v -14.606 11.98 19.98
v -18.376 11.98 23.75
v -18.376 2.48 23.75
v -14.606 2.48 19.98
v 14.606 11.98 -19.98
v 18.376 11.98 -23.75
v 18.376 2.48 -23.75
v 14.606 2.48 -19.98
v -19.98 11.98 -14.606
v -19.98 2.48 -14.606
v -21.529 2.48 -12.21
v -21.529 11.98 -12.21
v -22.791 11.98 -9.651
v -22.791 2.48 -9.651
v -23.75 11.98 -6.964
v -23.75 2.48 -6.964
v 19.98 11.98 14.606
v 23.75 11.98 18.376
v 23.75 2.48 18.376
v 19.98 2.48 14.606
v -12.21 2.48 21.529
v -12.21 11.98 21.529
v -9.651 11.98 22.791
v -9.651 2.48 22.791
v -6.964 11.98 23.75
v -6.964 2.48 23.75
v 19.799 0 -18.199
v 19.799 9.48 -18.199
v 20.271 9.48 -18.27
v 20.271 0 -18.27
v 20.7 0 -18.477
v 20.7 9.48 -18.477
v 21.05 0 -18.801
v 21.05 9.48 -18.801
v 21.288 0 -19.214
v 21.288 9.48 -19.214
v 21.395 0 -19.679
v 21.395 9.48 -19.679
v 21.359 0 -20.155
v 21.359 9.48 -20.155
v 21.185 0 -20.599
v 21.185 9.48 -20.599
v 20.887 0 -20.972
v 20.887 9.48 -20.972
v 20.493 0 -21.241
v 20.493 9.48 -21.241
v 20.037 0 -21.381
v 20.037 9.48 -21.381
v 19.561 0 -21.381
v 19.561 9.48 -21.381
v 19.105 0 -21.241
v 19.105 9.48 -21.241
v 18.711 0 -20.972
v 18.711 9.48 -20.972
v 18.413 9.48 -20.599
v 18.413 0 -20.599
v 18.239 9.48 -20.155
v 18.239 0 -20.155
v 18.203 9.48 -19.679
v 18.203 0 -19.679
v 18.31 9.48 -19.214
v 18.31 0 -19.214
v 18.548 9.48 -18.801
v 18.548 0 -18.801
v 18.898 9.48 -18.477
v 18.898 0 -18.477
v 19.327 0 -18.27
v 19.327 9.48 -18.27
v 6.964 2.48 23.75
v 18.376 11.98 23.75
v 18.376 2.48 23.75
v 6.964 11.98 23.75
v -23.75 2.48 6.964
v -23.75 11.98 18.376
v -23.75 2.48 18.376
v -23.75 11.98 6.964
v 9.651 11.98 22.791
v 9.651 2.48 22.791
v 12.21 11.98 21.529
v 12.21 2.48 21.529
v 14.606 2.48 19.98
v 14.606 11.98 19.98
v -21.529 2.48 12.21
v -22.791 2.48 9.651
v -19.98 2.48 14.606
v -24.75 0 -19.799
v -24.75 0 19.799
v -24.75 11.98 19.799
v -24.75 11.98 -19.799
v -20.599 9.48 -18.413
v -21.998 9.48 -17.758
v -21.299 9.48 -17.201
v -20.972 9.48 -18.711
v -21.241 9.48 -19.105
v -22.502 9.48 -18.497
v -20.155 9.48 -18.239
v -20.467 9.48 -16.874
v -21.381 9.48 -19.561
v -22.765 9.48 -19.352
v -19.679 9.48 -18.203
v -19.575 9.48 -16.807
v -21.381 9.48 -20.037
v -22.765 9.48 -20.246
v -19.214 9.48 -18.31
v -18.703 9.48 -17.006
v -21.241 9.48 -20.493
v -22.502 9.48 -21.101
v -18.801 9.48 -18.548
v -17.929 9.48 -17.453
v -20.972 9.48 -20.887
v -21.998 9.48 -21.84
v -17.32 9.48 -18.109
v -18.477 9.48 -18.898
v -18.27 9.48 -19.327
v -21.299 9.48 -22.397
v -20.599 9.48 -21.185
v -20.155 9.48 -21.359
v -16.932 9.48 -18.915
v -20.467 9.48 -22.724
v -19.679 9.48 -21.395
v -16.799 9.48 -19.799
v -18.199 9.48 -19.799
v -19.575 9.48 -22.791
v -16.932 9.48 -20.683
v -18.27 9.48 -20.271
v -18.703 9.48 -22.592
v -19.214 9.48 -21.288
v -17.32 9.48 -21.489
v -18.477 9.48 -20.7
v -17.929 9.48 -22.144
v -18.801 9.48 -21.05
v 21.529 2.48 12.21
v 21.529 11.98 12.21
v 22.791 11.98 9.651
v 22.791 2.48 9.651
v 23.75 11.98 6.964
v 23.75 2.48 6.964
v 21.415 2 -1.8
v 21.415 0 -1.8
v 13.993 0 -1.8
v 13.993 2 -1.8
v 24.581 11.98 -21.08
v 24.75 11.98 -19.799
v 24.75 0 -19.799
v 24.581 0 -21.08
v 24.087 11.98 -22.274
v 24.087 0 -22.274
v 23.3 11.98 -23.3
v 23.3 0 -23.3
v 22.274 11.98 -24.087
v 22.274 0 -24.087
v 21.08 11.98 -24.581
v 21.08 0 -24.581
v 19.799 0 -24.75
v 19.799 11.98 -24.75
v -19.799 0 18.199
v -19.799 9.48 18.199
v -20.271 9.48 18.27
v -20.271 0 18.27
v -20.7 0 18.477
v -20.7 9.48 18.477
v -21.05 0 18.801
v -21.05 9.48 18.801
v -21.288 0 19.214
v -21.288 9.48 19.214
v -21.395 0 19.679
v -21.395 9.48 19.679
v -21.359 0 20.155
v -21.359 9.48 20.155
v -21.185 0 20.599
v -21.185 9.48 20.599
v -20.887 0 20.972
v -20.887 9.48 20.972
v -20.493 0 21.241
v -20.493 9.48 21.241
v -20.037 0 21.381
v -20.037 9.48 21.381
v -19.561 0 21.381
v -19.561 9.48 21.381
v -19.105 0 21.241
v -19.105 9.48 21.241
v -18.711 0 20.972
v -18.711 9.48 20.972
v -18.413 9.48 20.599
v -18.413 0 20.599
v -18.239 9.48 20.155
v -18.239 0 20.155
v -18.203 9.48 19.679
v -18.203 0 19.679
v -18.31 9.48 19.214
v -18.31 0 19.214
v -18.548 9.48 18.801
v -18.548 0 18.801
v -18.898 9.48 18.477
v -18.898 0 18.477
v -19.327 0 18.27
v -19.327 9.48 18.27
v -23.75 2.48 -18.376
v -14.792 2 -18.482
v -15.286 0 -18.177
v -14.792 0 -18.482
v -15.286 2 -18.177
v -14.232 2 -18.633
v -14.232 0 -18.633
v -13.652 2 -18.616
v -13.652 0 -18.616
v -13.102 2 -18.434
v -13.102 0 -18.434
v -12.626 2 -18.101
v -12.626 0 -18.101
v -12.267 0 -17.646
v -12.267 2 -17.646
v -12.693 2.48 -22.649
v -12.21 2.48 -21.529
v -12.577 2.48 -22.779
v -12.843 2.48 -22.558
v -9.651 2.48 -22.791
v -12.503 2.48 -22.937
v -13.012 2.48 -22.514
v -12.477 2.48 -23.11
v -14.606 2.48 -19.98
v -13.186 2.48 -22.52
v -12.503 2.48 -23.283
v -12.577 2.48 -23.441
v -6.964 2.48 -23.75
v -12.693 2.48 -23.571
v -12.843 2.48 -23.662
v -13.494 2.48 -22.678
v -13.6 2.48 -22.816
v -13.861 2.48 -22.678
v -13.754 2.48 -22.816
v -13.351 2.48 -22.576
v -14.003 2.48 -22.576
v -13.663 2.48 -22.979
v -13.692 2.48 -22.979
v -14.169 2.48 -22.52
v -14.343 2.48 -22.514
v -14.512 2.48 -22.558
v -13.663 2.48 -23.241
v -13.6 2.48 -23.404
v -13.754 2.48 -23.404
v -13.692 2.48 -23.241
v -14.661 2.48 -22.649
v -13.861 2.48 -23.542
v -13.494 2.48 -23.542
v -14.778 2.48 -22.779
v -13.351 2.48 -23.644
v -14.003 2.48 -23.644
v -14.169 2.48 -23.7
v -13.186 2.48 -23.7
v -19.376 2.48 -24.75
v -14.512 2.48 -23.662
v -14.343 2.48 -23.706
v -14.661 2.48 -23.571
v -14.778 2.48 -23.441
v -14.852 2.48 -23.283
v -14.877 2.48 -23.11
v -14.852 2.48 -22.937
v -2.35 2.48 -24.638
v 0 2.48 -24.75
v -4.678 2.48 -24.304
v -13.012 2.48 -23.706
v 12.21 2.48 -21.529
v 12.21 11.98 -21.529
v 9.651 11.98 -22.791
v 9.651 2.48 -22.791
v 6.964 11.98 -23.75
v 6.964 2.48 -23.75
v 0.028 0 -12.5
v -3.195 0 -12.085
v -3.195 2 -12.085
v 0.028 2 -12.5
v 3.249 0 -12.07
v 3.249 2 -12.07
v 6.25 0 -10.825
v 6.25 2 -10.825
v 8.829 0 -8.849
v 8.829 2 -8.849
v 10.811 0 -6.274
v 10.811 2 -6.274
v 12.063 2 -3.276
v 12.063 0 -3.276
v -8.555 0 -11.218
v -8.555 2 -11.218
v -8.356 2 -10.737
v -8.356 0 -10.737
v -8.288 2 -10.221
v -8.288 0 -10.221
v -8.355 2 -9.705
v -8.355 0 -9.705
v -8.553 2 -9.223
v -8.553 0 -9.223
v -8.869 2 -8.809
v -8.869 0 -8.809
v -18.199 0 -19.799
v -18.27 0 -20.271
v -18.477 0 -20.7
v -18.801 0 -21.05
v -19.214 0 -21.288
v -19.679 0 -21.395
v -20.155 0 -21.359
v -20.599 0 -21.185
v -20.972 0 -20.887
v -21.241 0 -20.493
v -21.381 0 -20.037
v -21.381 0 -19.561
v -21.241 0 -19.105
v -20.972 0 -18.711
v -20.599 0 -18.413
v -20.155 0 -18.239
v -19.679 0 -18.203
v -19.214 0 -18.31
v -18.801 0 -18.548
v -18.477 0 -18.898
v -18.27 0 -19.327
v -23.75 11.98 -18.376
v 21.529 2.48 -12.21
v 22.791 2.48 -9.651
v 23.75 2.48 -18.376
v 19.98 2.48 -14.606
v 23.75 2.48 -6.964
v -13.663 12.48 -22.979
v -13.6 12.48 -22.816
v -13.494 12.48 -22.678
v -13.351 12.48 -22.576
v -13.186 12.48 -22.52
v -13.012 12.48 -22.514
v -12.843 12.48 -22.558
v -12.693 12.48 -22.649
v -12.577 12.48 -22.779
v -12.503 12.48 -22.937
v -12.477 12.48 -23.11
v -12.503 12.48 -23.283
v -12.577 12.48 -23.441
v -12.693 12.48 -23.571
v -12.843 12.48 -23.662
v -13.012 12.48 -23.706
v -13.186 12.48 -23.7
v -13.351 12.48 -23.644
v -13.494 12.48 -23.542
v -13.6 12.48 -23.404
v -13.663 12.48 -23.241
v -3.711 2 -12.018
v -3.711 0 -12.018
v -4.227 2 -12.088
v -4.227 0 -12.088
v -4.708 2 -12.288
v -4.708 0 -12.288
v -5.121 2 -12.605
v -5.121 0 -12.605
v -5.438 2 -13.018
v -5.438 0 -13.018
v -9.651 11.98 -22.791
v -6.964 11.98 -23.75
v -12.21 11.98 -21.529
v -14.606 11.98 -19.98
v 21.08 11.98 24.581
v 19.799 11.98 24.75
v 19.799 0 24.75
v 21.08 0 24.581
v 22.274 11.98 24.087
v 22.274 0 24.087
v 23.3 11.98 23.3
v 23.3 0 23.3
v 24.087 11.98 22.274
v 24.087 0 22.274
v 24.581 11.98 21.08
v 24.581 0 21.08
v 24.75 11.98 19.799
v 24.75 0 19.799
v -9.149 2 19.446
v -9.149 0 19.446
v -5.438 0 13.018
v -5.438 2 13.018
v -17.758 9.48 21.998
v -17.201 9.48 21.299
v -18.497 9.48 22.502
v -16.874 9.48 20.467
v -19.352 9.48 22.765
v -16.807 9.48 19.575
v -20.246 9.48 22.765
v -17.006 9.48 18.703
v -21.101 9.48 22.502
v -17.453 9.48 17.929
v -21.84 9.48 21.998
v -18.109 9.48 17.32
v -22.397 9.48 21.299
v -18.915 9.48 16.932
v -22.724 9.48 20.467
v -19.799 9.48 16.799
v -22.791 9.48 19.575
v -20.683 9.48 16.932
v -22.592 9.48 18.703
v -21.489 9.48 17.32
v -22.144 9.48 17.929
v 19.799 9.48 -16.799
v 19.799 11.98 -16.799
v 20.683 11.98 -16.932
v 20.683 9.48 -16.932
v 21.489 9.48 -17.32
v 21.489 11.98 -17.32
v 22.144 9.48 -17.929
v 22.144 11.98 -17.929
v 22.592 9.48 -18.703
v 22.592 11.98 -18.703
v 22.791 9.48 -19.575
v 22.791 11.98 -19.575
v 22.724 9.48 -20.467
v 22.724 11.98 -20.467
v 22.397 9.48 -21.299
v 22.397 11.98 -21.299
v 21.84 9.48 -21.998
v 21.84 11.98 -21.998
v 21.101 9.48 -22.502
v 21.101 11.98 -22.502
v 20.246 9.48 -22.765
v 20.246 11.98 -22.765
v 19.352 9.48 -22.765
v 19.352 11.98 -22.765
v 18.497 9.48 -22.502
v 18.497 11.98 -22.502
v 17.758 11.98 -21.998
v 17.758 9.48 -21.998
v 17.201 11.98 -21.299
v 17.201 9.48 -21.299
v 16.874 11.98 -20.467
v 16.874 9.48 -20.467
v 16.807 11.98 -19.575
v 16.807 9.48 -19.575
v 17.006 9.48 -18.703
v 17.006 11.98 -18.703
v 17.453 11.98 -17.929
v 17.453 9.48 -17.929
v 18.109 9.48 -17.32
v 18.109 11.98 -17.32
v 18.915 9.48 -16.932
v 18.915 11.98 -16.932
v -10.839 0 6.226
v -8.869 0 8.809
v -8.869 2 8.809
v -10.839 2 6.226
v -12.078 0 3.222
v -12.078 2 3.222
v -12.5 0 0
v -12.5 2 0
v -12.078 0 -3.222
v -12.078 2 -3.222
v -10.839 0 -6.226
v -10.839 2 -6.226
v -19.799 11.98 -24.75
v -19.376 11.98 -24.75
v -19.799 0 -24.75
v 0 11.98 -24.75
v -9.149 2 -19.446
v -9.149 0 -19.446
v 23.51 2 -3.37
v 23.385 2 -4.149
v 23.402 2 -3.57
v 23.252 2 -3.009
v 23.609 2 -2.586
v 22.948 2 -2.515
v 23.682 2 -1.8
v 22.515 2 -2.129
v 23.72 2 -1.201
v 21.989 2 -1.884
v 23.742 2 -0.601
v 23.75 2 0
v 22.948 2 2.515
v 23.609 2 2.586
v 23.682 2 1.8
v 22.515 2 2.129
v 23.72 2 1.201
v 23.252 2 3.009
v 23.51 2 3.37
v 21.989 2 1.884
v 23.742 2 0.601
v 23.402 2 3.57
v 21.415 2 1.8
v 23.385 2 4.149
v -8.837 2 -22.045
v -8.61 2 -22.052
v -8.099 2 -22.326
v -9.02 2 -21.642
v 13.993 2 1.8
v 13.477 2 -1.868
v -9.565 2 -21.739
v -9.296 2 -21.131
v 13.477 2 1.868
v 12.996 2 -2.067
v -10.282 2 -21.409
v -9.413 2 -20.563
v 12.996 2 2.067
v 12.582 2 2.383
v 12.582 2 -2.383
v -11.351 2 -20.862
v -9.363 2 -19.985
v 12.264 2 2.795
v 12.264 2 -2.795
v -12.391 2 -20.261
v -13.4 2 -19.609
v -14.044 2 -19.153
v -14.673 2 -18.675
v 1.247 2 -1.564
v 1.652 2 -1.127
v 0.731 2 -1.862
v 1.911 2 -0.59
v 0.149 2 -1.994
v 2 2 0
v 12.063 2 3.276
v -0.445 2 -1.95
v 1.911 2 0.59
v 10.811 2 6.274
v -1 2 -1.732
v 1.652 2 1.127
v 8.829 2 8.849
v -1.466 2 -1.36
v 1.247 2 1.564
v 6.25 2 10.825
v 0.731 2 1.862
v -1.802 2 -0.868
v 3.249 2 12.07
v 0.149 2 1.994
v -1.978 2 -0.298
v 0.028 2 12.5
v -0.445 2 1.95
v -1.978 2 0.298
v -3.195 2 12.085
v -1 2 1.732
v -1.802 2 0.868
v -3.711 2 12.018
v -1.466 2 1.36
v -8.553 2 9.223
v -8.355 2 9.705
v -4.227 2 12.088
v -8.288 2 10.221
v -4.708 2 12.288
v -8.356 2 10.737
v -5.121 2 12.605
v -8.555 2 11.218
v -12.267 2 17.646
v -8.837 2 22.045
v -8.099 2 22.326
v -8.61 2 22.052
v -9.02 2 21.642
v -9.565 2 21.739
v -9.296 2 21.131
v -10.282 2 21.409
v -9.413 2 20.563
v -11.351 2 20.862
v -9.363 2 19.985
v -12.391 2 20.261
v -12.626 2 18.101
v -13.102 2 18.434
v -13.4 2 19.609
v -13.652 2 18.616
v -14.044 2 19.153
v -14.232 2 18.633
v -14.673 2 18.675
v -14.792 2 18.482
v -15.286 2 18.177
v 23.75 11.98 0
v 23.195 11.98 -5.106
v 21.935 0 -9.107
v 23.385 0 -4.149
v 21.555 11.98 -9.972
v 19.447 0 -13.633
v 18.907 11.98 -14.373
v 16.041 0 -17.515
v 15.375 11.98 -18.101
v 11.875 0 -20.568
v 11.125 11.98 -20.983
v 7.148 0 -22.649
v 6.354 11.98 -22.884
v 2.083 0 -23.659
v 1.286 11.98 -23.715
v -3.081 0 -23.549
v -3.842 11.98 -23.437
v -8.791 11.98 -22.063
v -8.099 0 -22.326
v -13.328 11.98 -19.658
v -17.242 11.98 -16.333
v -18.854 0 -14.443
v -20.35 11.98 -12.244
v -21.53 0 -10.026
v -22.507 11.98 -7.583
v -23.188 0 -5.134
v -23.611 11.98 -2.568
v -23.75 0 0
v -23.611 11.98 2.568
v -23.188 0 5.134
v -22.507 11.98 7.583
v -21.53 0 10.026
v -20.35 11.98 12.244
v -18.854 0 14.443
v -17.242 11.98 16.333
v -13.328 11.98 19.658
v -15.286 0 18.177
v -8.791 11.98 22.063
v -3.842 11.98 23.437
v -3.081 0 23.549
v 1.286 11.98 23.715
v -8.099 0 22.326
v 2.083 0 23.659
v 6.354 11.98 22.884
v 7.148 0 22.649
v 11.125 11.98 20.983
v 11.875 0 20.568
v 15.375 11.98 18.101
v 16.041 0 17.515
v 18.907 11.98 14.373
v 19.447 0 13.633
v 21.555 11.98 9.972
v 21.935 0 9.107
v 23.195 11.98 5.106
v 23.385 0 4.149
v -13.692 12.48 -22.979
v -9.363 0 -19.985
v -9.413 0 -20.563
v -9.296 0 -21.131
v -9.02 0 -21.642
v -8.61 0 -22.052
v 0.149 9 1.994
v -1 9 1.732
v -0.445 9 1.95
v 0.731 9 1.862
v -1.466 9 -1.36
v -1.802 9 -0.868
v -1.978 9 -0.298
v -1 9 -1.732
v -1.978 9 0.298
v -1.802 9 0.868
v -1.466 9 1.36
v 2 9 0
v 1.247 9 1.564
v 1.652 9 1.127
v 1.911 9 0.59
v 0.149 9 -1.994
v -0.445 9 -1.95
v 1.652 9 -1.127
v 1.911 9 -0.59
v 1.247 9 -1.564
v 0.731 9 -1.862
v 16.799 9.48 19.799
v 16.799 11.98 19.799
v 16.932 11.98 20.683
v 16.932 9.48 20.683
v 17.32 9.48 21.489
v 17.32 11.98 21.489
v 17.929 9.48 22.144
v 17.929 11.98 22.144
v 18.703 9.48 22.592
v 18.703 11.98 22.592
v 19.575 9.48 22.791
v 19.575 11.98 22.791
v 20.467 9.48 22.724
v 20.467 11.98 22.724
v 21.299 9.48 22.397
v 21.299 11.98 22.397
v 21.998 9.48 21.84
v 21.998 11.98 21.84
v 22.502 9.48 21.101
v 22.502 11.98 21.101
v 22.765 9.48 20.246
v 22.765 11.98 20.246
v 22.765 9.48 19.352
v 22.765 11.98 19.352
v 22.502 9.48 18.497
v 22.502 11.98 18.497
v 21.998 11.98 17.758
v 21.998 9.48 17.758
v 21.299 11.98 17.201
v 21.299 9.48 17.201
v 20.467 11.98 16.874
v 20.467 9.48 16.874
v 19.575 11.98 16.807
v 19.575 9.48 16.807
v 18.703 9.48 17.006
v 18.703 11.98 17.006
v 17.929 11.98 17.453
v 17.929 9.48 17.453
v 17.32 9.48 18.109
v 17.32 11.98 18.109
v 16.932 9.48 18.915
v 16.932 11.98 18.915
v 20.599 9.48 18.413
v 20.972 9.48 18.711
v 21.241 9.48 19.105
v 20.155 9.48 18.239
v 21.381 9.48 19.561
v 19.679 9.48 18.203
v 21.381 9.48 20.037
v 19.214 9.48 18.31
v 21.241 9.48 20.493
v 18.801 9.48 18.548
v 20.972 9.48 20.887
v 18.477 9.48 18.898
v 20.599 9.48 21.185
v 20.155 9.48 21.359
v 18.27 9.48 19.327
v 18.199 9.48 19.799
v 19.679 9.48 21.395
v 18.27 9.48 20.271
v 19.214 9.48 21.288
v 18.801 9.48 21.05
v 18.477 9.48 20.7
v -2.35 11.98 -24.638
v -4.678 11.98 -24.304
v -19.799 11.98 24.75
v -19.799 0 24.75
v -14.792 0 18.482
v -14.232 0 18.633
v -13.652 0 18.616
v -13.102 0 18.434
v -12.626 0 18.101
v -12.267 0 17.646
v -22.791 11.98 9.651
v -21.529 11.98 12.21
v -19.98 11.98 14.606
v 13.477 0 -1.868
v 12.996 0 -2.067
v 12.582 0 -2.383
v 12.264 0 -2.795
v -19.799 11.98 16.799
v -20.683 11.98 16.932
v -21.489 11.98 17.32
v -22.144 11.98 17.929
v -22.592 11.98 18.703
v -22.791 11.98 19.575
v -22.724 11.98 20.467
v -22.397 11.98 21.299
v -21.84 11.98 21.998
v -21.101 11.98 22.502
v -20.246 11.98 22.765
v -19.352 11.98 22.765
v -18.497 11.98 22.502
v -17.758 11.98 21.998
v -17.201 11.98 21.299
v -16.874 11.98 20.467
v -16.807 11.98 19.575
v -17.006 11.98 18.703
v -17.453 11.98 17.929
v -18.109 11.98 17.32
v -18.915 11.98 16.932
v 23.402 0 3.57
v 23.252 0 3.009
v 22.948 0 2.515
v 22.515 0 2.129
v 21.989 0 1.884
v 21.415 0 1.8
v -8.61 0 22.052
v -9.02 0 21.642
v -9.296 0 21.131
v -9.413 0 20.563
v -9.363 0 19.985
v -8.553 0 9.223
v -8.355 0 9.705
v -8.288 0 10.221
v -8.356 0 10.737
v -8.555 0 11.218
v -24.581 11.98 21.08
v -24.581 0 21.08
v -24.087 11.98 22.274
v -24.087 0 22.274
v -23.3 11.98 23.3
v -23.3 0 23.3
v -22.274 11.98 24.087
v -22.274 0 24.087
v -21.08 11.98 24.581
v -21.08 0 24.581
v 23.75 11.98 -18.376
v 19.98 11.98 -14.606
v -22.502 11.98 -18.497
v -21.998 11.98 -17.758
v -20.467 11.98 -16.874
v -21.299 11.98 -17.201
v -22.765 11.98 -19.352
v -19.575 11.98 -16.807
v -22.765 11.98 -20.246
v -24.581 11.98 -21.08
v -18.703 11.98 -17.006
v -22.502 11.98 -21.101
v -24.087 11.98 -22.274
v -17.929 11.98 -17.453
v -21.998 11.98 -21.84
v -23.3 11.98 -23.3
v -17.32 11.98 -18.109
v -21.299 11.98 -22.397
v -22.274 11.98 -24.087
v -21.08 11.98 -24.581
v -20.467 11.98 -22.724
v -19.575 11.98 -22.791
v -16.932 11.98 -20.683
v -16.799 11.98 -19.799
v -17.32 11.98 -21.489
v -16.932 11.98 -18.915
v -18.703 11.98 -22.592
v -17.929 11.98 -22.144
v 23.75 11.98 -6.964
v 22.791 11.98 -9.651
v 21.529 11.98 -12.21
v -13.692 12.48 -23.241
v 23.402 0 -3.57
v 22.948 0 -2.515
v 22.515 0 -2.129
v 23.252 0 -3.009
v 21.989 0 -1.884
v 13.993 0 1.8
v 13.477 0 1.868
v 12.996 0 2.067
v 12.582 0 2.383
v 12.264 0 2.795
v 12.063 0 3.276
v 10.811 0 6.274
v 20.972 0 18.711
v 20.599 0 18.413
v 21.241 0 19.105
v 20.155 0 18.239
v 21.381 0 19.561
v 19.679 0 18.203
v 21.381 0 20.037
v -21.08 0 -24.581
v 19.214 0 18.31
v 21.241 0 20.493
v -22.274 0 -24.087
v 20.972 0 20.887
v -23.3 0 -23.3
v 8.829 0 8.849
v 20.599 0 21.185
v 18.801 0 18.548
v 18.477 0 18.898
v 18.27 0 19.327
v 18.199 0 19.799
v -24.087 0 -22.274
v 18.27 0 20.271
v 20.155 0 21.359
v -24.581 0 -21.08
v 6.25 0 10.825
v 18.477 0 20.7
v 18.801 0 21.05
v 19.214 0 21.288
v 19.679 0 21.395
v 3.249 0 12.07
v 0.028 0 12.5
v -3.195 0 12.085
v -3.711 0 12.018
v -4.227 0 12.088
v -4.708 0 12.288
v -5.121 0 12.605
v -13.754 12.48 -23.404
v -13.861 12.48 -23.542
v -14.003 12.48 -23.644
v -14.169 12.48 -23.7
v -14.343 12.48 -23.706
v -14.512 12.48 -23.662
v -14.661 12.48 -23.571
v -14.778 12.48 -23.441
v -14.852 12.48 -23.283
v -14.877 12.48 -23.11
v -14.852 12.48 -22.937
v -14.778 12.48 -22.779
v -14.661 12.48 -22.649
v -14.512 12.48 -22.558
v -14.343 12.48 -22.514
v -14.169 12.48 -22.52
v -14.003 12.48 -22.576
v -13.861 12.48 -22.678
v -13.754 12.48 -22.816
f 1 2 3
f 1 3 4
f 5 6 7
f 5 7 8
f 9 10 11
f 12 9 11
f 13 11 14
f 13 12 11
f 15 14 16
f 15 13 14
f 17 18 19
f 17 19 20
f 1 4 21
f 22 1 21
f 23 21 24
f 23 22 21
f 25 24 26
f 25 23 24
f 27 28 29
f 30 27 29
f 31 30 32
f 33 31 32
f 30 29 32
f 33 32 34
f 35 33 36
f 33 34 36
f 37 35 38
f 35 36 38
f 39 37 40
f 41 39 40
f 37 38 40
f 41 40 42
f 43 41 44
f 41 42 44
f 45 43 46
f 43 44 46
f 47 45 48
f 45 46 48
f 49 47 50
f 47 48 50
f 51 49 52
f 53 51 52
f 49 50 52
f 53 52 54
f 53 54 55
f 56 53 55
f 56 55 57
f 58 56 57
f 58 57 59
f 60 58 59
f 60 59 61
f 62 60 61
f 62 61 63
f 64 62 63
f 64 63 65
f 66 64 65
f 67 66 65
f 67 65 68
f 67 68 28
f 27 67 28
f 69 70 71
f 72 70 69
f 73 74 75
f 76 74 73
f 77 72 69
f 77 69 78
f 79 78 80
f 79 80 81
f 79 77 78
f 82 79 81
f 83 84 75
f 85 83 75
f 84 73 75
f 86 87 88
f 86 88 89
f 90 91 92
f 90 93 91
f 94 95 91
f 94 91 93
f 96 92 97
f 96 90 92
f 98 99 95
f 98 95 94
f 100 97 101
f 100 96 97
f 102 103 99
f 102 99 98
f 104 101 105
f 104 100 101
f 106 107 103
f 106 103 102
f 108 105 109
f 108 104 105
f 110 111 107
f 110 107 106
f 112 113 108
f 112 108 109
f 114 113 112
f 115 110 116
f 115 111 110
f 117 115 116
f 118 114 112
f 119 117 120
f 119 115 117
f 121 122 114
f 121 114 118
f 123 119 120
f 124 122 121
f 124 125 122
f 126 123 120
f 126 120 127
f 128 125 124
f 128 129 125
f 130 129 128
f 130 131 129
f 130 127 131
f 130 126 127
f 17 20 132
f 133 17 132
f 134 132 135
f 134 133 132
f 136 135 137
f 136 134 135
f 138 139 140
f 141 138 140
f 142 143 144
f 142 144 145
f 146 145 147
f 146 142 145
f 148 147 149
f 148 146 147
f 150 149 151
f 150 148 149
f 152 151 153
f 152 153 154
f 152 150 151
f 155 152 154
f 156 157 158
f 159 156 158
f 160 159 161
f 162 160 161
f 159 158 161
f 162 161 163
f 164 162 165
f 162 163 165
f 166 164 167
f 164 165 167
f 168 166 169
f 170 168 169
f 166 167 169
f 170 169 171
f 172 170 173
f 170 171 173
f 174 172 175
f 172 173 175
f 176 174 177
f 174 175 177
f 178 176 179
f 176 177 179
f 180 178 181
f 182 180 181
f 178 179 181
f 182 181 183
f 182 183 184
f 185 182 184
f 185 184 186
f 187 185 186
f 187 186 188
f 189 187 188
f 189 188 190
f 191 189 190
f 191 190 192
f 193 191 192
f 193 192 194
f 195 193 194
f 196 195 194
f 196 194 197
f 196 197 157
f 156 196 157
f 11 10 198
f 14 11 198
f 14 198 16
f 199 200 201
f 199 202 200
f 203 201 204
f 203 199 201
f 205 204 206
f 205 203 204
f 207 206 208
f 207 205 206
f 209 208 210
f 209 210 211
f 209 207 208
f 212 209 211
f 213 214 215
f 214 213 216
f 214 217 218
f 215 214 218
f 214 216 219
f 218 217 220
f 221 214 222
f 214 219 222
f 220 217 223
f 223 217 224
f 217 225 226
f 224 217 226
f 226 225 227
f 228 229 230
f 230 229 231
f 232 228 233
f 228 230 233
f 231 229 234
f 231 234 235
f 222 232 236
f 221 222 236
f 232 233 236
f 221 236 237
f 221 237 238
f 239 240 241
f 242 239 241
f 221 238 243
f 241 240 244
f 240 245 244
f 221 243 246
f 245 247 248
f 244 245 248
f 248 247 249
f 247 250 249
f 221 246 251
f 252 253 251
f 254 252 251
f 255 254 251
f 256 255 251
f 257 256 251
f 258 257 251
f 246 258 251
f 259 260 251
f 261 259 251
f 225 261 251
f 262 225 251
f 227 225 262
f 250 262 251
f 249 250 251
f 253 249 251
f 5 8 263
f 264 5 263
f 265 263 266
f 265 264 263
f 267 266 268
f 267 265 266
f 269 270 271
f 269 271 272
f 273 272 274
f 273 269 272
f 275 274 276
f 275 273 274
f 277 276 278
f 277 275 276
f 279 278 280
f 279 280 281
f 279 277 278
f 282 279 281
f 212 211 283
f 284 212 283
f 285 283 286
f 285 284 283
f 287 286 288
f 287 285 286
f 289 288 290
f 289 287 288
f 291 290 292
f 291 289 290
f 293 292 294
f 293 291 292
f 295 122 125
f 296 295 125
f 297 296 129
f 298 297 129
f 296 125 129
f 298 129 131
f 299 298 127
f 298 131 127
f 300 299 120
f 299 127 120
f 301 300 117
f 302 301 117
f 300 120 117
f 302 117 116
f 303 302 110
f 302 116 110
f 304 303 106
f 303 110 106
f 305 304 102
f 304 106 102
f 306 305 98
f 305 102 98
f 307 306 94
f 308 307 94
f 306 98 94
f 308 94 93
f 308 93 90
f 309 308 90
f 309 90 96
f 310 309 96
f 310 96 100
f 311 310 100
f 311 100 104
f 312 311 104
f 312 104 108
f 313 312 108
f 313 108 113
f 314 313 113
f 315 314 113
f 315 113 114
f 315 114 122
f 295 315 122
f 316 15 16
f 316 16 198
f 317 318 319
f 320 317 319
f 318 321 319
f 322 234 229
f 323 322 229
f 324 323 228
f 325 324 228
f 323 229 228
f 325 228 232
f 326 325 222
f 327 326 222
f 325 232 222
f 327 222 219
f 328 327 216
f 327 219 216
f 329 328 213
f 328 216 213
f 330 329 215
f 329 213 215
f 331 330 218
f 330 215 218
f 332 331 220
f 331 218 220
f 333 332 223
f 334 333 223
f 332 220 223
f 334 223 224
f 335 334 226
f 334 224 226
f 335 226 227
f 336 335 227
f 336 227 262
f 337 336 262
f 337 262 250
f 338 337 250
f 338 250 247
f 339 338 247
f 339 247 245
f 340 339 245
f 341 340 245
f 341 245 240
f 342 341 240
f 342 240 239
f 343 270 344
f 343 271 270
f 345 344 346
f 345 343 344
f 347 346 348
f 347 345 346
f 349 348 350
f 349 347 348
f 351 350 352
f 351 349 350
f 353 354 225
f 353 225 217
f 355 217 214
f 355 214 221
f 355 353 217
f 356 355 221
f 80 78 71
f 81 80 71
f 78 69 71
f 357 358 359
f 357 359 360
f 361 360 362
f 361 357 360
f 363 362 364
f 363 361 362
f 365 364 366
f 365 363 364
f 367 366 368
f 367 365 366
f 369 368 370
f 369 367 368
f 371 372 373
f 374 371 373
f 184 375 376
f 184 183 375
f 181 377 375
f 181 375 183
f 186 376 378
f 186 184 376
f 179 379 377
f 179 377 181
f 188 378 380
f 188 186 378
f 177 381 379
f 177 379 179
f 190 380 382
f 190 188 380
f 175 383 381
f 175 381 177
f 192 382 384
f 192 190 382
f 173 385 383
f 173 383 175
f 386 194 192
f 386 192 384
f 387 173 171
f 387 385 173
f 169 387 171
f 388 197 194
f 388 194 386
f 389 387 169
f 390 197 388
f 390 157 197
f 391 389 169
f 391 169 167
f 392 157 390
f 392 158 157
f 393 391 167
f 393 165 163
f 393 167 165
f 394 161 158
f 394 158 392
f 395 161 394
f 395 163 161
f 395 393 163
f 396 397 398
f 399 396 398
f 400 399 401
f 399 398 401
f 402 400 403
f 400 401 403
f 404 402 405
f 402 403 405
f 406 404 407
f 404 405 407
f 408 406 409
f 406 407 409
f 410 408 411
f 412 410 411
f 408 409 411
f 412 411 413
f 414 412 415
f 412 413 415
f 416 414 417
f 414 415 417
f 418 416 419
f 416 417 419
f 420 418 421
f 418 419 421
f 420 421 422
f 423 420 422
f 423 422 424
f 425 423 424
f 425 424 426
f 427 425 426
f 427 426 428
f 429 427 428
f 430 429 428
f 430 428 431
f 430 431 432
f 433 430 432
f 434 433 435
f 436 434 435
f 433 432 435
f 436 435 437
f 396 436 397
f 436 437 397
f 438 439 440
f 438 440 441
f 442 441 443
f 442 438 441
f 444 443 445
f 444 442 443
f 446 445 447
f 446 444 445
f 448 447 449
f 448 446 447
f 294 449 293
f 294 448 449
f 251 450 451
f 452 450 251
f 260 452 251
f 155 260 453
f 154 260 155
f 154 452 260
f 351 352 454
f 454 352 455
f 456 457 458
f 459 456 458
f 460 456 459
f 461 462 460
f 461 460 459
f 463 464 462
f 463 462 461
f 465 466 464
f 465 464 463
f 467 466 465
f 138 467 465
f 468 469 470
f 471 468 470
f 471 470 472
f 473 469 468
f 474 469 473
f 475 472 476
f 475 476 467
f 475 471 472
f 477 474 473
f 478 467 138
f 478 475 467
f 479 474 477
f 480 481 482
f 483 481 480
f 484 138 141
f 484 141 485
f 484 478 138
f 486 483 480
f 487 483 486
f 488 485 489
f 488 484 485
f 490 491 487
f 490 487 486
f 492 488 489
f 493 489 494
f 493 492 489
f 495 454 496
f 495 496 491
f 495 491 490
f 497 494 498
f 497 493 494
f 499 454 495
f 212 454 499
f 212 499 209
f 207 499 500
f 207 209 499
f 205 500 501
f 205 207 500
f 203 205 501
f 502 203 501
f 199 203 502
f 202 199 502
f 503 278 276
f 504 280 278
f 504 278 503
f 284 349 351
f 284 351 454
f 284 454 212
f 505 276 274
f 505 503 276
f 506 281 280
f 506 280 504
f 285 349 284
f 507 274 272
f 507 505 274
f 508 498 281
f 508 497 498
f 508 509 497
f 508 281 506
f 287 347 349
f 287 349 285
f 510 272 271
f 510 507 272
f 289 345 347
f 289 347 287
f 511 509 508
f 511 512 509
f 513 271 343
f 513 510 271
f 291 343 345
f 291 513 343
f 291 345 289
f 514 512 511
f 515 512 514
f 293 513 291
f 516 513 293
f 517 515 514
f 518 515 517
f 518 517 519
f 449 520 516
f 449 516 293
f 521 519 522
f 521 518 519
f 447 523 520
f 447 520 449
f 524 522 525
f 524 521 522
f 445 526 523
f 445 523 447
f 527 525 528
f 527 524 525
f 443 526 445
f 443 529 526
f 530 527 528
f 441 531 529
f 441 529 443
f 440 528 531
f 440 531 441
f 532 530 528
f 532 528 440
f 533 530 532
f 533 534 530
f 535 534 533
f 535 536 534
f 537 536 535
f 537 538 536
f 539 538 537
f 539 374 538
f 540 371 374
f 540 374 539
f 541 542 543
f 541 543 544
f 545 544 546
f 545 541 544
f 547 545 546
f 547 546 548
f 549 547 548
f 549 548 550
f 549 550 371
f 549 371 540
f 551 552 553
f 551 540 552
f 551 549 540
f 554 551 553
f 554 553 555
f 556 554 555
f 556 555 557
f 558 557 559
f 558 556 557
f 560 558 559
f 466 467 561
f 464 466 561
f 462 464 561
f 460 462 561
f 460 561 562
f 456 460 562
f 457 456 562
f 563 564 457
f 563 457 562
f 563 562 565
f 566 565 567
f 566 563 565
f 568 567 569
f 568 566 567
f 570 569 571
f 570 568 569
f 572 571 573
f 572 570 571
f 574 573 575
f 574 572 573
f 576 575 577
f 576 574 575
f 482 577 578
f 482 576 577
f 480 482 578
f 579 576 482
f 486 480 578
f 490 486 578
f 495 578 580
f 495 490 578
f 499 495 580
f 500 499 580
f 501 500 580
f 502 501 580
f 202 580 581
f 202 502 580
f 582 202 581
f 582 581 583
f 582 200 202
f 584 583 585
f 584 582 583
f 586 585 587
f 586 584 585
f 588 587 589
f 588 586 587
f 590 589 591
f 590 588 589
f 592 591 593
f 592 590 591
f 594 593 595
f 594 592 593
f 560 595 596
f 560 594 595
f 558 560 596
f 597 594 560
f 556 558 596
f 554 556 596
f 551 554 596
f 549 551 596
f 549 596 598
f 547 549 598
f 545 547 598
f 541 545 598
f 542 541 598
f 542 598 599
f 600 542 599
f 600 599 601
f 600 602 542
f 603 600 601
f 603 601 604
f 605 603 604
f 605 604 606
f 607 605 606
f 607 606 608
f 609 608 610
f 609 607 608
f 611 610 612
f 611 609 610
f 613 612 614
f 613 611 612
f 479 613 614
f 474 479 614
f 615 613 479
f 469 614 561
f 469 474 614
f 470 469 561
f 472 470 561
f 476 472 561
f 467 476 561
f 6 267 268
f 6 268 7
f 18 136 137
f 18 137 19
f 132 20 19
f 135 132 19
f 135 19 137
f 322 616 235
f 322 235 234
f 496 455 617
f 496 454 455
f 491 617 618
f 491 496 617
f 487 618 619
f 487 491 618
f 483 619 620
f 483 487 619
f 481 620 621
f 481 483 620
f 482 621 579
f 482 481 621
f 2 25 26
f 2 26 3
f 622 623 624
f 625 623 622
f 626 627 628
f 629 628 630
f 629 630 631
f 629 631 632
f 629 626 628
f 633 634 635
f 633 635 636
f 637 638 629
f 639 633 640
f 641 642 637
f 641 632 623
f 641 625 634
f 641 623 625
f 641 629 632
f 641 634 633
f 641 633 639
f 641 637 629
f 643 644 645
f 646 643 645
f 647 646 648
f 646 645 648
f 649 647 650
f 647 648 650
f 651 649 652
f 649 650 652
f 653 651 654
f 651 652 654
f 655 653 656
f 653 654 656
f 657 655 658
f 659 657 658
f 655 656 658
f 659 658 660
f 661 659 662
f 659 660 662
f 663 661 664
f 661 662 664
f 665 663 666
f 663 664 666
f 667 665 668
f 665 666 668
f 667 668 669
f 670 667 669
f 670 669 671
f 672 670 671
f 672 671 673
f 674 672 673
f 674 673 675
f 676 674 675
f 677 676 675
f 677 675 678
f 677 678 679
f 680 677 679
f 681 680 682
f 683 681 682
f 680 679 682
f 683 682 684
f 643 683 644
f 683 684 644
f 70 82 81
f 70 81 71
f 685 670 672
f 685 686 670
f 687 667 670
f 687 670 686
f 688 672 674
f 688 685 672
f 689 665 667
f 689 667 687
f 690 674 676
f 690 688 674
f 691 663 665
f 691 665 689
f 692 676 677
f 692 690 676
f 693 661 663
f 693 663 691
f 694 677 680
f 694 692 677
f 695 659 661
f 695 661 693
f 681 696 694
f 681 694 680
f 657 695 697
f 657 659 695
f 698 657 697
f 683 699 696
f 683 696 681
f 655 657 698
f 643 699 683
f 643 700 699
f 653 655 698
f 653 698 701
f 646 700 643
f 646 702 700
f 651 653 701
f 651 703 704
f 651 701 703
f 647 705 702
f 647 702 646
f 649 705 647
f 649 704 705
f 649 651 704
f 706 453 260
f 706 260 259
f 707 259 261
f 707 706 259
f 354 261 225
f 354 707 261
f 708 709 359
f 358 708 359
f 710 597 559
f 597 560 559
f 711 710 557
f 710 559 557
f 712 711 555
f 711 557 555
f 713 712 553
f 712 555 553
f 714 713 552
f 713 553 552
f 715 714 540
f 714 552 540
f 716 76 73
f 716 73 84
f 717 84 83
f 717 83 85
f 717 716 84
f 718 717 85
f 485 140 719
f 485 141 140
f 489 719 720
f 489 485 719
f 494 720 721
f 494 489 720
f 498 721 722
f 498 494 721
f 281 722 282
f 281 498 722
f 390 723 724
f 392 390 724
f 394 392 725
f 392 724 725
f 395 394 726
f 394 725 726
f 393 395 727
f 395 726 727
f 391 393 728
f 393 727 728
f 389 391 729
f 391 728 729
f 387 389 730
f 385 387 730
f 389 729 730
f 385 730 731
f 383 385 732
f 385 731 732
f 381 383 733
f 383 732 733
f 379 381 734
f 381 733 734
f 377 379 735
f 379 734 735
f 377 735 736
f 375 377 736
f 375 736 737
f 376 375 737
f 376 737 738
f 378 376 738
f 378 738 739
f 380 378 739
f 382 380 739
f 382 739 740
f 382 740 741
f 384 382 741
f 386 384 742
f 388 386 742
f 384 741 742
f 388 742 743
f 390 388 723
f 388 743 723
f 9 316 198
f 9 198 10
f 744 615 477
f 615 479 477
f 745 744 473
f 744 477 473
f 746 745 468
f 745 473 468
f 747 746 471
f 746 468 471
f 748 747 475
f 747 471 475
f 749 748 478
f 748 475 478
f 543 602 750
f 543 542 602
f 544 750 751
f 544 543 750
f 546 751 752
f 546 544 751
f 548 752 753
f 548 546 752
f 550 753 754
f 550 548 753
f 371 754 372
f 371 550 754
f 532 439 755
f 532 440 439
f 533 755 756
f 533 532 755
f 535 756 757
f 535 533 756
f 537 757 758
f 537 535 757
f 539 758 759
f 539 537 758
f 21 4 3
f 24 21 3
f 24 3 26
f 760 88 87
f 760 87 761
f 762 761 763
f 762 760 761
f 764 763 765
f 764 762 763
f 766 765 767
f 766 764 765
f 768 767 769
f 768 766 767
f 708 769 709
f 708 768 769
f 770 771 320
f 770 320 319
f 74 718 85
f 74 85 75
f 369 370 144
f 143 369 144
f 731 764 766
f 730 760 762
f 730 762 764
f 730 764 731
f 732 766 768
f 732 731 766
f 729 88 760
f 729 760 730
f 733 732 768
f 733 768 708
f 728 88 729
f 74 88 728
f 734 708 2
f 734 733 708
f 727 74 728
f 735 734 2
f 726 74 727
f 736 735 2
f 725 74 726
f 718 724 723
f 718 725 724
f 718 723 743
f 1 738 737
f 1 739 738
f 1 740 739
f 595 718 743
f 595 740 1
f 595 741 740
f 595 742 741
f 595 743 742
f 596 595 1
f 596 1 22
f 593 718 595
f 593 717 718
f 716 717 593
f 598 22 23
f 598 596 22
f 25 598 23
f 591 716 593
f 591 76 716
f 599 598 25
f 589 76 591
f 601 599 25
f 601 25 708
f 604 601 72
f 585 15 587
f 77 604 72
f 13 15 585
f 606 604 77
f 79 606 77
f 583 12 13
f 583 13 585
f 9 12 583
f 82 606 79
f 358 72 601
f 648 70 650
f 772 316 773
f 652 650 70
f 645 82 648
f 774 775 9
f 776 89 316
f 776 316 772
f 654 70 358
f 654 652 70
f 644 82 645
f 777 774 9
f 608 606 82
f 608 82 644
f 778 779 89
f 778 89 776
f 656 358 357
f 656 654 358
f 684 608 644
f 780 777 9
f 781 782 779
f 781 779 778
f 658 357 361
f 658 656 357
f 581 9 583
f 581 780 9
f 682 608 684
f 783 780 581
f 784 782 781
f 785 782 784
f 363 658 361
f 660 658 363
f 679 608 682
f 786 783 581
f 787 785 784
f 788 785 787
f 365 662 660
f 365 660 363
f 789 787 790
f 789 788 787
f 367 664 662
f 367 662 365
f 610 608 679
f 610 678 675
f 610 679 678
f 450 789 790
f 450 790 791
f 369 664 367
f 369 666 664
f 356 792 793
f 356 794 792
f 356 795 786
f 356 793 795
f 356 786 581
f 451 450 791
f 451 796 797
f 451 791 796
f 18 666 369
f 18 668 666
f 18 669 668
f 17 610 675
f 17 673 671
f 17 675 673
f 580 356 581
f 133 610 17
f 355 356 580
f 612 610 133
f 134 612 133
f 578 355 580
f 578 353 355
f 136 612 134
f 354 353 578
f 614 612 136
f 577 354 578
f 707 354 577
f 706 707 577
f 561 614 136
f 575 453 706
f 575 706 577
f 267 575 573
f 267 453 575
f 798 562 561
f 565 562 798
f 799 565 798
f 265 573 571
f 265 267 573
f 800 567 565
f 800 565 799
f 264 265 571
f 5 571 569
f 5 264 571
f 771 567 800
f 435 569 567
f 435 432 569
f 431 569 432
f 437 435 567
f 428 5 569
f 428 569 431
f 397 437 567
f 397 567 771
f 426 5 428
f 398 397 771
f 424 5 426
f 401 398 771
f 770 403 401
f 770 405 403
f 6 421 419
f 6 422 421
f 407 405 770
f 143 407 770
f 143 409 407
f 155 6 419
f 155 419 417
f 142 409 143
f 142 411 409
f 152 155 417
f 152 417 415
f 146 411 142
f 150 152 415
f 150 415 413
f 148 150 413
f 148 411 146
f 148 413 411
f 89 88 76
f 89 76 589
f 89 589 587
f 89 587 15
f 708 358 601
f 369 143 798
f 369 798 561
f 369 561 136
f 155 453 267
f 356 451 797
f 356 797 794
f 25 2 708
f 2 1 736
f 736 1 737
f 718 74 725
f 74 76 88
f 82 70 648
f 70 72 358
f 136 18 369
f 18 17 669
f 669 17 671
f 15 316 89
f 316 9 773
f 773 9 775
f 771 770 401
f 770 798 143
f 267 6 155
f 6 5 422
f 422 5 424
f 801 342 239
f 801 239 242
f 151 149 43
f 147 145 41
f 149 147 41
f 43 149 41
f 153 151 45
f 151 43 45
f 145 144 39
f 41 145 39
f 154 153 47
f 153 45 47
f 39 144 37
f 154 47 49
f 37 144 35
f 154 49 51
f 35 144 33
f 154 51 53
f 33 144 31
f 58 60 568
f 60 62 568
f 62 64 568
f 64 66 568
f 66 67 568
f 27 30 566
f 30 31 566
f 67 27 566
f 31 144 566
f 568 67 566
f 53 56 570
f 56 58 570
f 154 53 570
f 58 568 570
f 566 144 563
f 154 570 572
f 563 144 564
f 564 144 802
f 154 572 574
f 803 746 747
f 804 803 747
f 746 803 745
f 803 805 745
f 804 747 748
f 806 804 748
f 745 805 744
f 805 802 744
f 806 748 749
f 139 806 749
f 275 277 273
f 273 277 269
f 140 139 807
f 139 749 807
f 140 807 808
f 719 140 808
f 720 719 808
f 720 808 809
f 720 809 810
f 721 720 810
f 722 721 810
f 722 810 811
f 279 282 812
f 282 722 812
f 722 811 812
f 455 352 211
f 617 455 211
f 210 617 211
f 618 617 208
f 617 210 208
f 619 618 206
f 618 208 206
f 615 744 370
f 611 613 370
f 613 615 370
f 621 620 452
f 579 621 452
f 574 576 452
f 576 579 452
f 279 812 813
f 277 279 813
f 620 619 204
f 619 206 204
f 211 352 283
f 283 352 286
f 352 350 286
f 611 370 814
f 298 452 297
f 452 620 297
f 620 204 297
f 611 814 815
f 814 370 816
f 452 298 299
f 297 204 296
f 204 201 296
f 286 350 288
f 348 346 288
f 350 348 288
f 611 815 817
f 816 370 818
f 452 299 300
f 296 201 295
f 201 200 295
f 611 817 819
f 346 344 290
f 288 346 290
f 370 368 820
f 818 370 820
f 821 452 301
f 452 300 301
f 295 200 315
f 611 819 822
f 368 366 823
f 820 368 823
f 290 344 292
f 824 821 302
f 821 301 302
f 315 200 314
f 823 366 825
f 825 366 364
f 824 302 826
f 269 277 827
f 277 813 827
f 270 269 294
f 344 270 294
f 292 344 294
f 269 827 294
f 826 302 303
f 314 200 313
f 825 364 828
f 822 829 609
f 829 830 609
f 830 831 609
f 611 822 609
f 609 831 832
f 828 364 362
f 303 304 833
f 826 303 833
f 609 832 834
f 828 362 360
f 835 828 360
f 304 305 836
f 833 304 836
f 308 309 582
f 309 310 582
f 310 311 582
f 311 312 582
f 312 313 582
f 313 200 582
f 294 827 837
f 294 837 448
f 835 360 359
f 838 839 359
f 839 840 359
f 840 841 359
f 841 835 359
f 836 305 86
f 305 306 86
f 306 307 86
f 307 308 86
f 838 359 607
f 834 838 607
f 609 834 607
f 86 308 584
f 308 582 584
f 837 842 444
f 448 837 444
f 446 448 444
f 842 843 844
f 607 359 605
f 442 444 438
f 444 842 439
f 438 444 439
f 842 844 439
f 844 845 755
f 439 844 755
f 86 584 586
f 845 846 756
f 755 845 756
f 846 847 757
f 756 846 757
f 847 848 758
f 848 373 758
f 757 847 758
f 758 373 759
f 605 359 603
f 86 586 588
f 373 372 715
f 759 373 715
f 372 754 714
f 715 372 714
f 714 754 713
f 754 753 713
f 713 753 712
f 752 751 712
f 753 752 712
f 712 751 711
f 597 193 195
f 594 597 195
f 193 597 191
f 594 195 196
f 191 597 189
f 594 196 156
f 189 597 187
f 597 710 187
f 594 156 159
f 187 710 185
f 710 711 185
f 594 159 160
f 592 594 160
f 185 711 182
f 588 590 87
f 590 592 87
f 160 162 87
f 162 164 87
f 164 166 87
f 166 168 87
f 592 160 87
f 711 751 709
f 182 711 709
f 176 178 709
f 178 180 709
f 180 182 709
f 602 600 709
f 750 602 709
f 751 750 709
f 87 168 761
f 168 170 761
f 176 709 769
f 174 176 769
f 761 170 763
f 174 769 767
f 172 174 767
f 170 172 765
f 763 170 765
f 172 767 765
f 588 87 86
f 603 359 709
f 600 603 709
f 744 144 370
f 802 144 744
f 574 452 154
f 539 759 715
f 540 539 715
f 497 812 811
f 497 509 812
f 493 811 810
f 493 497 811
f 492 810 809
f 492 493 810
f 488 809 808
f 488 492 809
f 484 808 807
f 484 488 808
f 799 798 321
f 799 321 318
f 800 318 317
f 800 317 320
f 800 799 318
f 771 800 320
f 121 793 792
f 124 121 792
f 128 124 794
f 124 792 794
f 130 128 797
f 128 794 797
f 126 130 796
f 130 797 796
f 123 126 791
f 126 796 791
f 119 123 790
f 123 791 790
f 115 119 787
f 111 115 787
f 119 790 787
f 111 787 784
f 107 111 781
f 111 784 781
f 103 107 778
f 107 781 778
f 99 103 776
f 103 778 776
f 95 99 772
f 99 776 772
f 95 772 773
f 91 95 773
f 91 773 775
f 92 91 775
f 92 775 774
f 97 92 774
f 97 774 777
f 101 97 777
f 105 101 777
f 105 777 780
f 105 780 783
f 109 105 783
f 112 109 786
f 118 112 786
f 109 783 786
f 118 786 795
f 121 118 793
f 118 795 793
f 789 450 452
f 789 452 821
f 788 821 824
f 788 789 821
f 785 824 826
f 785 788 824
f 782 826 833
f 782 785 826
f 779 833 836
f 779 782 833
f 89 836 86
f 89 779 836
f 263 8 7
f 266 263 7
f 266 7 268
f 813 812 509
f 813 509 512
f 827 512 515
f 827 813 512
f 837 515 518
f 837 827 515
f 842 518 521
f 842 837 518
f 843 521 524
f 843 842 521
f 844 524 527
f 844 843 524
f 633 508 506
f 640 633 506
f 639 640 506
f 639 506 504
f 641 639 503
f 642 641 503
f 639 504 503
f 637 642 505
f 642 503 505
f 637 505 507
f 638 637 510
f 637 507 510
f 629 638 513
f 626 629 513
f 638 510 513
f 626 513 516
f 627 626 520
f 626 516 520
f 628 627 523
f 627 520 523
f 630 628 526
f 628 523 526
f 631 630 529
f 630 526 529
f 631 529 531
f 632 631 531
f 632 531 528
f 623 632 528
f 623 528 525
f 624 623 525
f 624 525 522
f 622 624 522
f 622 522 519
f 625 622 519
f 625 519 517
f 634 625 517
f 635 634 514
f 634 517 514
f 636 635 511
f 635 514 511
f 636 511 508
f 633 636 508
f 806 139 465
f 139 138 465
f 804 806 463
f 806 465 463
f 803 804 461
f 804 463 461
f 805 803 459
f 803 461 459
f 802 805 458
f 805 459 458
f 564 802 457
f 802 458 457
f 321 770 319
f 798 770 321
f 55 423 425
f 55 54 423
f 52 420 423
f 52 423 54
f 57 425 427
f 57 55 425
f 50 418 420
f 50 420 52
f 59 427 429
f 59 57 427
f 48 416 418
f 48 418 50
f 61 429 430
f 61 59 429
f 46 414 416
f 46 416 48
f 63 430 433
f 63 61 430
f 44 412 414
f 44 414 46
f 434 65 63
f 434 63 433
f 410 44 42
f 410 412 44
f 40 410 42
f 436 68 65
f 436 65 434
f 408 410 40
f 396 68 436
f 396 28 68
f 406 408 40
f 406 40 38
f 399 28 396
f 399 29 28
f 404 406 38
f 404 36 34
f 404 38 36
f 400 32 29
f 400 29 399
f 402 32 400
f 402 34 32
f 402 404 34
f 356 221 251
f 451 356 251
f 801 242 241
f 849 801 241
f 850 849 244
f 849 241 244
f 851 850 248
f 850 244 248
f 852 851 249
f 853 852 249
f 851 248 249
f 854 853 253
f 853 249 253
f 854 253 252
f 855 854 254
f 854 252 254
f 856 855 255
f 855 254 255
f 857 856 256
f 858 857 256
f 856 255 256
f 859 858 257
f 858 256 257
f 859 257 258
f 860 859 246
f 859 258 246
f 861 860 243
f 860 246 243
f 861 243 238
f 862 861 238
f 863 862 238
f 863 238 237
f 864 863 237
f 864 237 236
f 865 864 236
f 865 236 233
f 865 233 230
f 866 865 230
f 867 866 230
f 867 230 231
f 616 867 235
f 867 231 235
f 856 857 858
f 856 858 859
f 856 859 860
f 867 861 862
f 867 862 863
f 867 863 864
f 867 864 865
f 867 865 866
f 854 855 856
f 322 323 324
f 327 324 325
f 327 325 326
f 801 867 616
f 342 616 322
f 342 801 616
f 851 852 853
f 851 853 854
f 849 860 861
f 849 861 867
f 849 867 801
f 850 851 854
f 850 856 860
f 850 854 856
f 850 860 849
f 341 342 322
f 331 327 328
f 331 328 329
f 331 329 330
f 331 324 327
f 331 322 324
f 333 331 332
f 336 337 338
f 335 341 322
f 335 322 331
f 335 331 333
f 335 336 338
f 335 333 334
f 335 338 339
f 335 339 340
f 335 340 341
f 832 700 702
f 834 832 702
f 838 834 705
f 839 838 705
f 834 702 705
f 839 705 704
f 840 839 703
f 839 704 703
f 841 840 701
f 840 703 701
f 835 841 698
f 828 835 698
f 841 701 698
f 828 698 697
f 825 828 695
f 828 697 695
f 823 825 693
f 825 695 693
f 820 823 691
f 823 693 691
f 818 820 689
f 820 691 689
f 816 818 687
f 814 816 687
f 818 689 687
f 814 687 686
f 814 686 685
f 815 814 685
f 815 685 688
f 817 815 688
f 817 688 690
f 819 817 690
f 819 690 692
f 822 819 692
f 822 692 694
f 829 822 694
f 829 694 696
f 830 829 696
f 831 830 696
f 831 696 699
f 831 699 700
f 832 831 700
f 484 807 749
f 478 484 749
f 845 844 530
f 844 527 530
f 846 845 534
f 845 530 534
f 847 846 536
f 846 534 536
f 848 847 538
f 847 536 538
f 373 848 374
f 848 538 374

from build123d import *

# Parameters (mm, degrees)
SKETCH_1_W                       = 49.5
SKETCH_1_H                       = 49.5
SKETCH_1_R                       = 23.75
EXTRUDE_1_DEPTH                  = 11.98
SKETCH_2_R                       = 3
CUT_EXTRUDE_1_DEPTH              = 2.5
SKETCH_3_R                       = 1.6
CUT_EXTRUDE_2_DEPTH              = 10.48
CUT_EXTRUDE_3_DEPTH              = 12.98
CUT_EXTRUDE_4_DEPTH              = 9.5
PATTERN_CIRCULAR_1_COUNT         = 4
SKETCH_7_R                       = 12.5
EXTRUDE_2_DEPTH                  = 2
EXTRUDE_3_DEPTH                  = 2
FILLET_2_R                       = 2
PATTERN_CIRCULAR_2_COUNT         = 3
FILLET_2_OF_PATTERN_CIRCULAR_2_R = 2
SKETCH_9_R                       = 2
EXTRUDE_4_DEPTH                  = 7
CUT_EXTRUDE_5_DEPTH              = 9.5
EXTRUDE_5_DEPTH                  = 10


with BuildPart() as part:
    # 草图1 → 凸台-拉伸1 (new body)
    with BuildSketch(Plane(origin=(0, 0, 0), x_dir=(1, 0, 0), z_dir=(0, 1, 0))):
        Rectangle(SKETCH_1_W, SKETCH_1_H)
        Circle(SKETCH_1_R, mode=Mode.SUBTRACT)
    extrude(amount=EXTRUDE_1_DEPTH)

    # 草图2 → 切除-拉伸1 (cut)
    with BuildSketch(Plane(origin=(0, 11.98, 0), x_dir=(1, 0, 0), z_dir=(0, 1, 0))):
        with Locations((-19.798989873, 19.798989873)):
            Circle(SKETCH_2_R)
    cut_extrude_1 = extrude(amount=-CUT_EXTRUDE_1_DEPTH, mode=Mode.SUBTRACT)

    # 草图3 → 切除-拉伸2 (cut, through all)
    with BuildSketch(Plane(origin=(0, 9.48, 0), x_dir=(1, 0, 0), z_dir=(0, 1, 0))):
        with Locations((-19.798989873, 19.798989873)):
            Circle(SKETCH_3_R)
    cut_extrude_2 = extrude(amount=-CUT_EXTRUDE_2_DEPTH, mode=Mode.SUBTRACT)

    # 草图4 → 切除-拉伸3 (cut, through all)
    with BuildSketch(Plane(origin=(0, 11.98, 0), x_dir=(1, 0, 0), z_dir=(0, 1, 0))):
        with BuildLine():
            Line((-24.75, 19.798989873), (-24.75, 24.75))
            Line((-24.75, 24.75), (-19.798989873, 24.75))
            ThreePointArc((-19.798989873, 24.75), (-23.299882708, 23.299882708), (-24.75, 19.798989873))
        make_face()
    cut_extrude_3 = extrude(amount=-CUT_EXTRUDE_3_DEPTH, mode=Mode.SUBTRACT)

    # 草图5 → 切除-拉伸4 (cut)
    with BuildSketch(Plane(origin=(0, 11.98, 0), x_dir=(1, 0, 0), z_dir=(0, 1, 0))):
        with BuildLine():
            Line((-23.75, 18.375988463), (-19.980393233, 14.606381696))
            ThreePointArc((-19.980393233, 14.606381696), (-22.196566868, 10.948740533), (-23.75, 6.964194139))
            Line((-23.75, 6.964194139), (-23.75, 18.375988463))
        make_face()
        with BuildLine():
            Line((-18.375988463, 23.75), (-6.964194139, 23.75))
            ThreePointArc((-6.964194139, 23.75), (-10.948740533, 22.196566868), (-14.606381696, 19.980393233))
            Line((-14.606381696, 19.980393233), (-18.375988463, 23.75))
        make_face()
    cut_extrude_4 = extrude(amount=-CUT_EXTRUDE_4_DEPTH, mode=Mode.SUBTRACT)

    # 阵列(圆周)1: 切除-拉伸1, 切除-拉伸2, 切除-拉伸3, 切除-拉伸4 ×4 about axis
    pattern_circular_1_axis = Axis((0, 0, 0), (0, 1, 0))
    for i in range(1, PATTERN_CIRCULAR_1_COUNT):
        add(cut_extrude_1.rotate(pattern_circular_1_axis, i * 360 / PATTERN_CIRCULAR_1_COUNT), mode=Mode.SUBTRACT)
        add(cut_extrude_2.rotate(pattern_circular_1_axis, i * 360 / PATTERN_CIRCULAR_1_COUNT), mode=Mode.SUBTRACT)
        add(cut_extrude_3.rotate(pattern_circular_1_axis, i * 360 / PATTERN_CIRCULAR_1_COUNT), mode=Mode.SUBTRACT)
        add(cut_extrude_4.rotate(pattern_circular_1_axis, i * 360 / PATTERN_CIRCULAR_1_COUNT), mode=Mode.SUBTRACT)



with BuildPart() as body_2:
    # 草图7 → 凸台-拉伸2 (new body)
    with BuildSketch(Plane.XZ):
        Circle(SKETCH_7_R)
    extrude(amount=-EXTRUDE_2_DEPTH)


with BuildPart() as part_1:
    add(part.part)

    add(body_2.part)  # 凸台-拉伸3 merges body 2
    # 草图8 → 凸台-拉伸3 (add)
    with BuildSketch(Plane.XZ):
        with BuildLine():
            Line((23.68169124, -1.8), (12.369721096, -1.8))
            ThreePointArc((12.369721096, -1.8), (12.5, 0), (12.369721096, 1.8))
            Line((12.369721096, 1.8), (23.68169124, 1.8))
            ThreePointArc((23.68169124, 1.8), (23.75, 0), (23.68169124, -1.8))
        make_face()
    extrude_3 = extrude(amount=-EXTRUDE_3_DEPTH)

    # 圆角2
    fillet_2_edges = [part_1.edges().sort_by_distance(p)[0] for p in [
        (23.68169124, 1, 1.8),
        (23.68169124, 1, -1.8),
        (12.369721096, 1, -1.8),
        (12.369721096, 1, 1.8),
    ]]
    fillet(fillet_2_edges, radius=FILLET_2_R)

    # 阵列(圆周)2: 凸台-拉伸3 ×3 about axis
    pattern_circular_2_axis = Axis((0, 0, 0), (0, 1, 0))
    for i in range(1, PATTERN_CIRCULAR_2_COUNT):
        add(extrude_3.rotate(pattern_circular_2_axis, i * 360 / PATTERN_CIRCULAR_2_COUNT))

    # 圆角2 of 阵列(圆周)2
    fillet_2_of_pattern_circular_2_edges = [part_1.edges().sort_by_distance(p)[0] for p in [
        (-10.281999893, 1, -21.408946219),
        (-13.399691347, 1, -19.608946219),
        (-7.743706275, 1, -9.812492707),
        (-4.626014821, 1, -11.612492707),
        (-13.399691347, 1, 19.608946219),
        (-10.281999893, 1, 21.408946219),
        (-4.626014821, 1, 11.612492707),
        (-7.743706275, 1, 9.812492707),
    ]]
    fillet(fillet_2_of_pattern_circular_2_edges, radius=FILLET_2_OF_PATTERN_CIRCULAR_2_R)

    # 草图9 → 凸台-拉伸4 (add)
    with BuildSketch(Plane(origin=(0, 2, 0), x_dir=(1, 0, 0), z_dir=(0, 1, 0))):
        Circle(SKETCH_9_R)
    extrude(amount=EXTRUDE_4_DEPTH)

    # 草图10 → 切除-拉伸5 (cut)
    with BuildSketch(Plane(origin=(0, 11.98, 0), x_dir=(1, 0, 0), z_dir=(0, 1, 0))):
        with BuildLine():
            Line((-14.606381696, 19.980393233), (-19.375988463, 24.75))
            Line((-19.375988463, 24.75), (0, 24.75))
            ThreePointArc((0, 24.75), (-7.68270029, 23.527401392), (-14.606381696, 19.980393233))
        make_face()
    extrude(amount=-CUT_EXTRUDE_5_DEPTH, mode=Mode.SUBTRACT)

    # 草图11 → 凸台-拉伸5 (add)
    with BuildSketch(Plane(origin=(0, 2.48, 0), x_dir=(1, 0, 0), z_dir=(0, 1, 0))):
        with BuildLine():
            Line((-13.662941725, 23.240819528), (-13.691818706, 23.240819528))
            ThreePointArc((-13.691818706, 23.240819528), (-14.877380215, 23.109984827), (-13.691818706, 22.979150126))
            Line((-13.691818706, 22.979150126), (-13.662941725, 22.979150126))
            ThreePointArc((-13.662941725, 22.979150126), (-12.477380215, 23.109984827), (-13.662941725, 23.240819528))
        make_face()
    extrude(amount=EXTRUDE_5_DEPTH)


solid = part_1.part
